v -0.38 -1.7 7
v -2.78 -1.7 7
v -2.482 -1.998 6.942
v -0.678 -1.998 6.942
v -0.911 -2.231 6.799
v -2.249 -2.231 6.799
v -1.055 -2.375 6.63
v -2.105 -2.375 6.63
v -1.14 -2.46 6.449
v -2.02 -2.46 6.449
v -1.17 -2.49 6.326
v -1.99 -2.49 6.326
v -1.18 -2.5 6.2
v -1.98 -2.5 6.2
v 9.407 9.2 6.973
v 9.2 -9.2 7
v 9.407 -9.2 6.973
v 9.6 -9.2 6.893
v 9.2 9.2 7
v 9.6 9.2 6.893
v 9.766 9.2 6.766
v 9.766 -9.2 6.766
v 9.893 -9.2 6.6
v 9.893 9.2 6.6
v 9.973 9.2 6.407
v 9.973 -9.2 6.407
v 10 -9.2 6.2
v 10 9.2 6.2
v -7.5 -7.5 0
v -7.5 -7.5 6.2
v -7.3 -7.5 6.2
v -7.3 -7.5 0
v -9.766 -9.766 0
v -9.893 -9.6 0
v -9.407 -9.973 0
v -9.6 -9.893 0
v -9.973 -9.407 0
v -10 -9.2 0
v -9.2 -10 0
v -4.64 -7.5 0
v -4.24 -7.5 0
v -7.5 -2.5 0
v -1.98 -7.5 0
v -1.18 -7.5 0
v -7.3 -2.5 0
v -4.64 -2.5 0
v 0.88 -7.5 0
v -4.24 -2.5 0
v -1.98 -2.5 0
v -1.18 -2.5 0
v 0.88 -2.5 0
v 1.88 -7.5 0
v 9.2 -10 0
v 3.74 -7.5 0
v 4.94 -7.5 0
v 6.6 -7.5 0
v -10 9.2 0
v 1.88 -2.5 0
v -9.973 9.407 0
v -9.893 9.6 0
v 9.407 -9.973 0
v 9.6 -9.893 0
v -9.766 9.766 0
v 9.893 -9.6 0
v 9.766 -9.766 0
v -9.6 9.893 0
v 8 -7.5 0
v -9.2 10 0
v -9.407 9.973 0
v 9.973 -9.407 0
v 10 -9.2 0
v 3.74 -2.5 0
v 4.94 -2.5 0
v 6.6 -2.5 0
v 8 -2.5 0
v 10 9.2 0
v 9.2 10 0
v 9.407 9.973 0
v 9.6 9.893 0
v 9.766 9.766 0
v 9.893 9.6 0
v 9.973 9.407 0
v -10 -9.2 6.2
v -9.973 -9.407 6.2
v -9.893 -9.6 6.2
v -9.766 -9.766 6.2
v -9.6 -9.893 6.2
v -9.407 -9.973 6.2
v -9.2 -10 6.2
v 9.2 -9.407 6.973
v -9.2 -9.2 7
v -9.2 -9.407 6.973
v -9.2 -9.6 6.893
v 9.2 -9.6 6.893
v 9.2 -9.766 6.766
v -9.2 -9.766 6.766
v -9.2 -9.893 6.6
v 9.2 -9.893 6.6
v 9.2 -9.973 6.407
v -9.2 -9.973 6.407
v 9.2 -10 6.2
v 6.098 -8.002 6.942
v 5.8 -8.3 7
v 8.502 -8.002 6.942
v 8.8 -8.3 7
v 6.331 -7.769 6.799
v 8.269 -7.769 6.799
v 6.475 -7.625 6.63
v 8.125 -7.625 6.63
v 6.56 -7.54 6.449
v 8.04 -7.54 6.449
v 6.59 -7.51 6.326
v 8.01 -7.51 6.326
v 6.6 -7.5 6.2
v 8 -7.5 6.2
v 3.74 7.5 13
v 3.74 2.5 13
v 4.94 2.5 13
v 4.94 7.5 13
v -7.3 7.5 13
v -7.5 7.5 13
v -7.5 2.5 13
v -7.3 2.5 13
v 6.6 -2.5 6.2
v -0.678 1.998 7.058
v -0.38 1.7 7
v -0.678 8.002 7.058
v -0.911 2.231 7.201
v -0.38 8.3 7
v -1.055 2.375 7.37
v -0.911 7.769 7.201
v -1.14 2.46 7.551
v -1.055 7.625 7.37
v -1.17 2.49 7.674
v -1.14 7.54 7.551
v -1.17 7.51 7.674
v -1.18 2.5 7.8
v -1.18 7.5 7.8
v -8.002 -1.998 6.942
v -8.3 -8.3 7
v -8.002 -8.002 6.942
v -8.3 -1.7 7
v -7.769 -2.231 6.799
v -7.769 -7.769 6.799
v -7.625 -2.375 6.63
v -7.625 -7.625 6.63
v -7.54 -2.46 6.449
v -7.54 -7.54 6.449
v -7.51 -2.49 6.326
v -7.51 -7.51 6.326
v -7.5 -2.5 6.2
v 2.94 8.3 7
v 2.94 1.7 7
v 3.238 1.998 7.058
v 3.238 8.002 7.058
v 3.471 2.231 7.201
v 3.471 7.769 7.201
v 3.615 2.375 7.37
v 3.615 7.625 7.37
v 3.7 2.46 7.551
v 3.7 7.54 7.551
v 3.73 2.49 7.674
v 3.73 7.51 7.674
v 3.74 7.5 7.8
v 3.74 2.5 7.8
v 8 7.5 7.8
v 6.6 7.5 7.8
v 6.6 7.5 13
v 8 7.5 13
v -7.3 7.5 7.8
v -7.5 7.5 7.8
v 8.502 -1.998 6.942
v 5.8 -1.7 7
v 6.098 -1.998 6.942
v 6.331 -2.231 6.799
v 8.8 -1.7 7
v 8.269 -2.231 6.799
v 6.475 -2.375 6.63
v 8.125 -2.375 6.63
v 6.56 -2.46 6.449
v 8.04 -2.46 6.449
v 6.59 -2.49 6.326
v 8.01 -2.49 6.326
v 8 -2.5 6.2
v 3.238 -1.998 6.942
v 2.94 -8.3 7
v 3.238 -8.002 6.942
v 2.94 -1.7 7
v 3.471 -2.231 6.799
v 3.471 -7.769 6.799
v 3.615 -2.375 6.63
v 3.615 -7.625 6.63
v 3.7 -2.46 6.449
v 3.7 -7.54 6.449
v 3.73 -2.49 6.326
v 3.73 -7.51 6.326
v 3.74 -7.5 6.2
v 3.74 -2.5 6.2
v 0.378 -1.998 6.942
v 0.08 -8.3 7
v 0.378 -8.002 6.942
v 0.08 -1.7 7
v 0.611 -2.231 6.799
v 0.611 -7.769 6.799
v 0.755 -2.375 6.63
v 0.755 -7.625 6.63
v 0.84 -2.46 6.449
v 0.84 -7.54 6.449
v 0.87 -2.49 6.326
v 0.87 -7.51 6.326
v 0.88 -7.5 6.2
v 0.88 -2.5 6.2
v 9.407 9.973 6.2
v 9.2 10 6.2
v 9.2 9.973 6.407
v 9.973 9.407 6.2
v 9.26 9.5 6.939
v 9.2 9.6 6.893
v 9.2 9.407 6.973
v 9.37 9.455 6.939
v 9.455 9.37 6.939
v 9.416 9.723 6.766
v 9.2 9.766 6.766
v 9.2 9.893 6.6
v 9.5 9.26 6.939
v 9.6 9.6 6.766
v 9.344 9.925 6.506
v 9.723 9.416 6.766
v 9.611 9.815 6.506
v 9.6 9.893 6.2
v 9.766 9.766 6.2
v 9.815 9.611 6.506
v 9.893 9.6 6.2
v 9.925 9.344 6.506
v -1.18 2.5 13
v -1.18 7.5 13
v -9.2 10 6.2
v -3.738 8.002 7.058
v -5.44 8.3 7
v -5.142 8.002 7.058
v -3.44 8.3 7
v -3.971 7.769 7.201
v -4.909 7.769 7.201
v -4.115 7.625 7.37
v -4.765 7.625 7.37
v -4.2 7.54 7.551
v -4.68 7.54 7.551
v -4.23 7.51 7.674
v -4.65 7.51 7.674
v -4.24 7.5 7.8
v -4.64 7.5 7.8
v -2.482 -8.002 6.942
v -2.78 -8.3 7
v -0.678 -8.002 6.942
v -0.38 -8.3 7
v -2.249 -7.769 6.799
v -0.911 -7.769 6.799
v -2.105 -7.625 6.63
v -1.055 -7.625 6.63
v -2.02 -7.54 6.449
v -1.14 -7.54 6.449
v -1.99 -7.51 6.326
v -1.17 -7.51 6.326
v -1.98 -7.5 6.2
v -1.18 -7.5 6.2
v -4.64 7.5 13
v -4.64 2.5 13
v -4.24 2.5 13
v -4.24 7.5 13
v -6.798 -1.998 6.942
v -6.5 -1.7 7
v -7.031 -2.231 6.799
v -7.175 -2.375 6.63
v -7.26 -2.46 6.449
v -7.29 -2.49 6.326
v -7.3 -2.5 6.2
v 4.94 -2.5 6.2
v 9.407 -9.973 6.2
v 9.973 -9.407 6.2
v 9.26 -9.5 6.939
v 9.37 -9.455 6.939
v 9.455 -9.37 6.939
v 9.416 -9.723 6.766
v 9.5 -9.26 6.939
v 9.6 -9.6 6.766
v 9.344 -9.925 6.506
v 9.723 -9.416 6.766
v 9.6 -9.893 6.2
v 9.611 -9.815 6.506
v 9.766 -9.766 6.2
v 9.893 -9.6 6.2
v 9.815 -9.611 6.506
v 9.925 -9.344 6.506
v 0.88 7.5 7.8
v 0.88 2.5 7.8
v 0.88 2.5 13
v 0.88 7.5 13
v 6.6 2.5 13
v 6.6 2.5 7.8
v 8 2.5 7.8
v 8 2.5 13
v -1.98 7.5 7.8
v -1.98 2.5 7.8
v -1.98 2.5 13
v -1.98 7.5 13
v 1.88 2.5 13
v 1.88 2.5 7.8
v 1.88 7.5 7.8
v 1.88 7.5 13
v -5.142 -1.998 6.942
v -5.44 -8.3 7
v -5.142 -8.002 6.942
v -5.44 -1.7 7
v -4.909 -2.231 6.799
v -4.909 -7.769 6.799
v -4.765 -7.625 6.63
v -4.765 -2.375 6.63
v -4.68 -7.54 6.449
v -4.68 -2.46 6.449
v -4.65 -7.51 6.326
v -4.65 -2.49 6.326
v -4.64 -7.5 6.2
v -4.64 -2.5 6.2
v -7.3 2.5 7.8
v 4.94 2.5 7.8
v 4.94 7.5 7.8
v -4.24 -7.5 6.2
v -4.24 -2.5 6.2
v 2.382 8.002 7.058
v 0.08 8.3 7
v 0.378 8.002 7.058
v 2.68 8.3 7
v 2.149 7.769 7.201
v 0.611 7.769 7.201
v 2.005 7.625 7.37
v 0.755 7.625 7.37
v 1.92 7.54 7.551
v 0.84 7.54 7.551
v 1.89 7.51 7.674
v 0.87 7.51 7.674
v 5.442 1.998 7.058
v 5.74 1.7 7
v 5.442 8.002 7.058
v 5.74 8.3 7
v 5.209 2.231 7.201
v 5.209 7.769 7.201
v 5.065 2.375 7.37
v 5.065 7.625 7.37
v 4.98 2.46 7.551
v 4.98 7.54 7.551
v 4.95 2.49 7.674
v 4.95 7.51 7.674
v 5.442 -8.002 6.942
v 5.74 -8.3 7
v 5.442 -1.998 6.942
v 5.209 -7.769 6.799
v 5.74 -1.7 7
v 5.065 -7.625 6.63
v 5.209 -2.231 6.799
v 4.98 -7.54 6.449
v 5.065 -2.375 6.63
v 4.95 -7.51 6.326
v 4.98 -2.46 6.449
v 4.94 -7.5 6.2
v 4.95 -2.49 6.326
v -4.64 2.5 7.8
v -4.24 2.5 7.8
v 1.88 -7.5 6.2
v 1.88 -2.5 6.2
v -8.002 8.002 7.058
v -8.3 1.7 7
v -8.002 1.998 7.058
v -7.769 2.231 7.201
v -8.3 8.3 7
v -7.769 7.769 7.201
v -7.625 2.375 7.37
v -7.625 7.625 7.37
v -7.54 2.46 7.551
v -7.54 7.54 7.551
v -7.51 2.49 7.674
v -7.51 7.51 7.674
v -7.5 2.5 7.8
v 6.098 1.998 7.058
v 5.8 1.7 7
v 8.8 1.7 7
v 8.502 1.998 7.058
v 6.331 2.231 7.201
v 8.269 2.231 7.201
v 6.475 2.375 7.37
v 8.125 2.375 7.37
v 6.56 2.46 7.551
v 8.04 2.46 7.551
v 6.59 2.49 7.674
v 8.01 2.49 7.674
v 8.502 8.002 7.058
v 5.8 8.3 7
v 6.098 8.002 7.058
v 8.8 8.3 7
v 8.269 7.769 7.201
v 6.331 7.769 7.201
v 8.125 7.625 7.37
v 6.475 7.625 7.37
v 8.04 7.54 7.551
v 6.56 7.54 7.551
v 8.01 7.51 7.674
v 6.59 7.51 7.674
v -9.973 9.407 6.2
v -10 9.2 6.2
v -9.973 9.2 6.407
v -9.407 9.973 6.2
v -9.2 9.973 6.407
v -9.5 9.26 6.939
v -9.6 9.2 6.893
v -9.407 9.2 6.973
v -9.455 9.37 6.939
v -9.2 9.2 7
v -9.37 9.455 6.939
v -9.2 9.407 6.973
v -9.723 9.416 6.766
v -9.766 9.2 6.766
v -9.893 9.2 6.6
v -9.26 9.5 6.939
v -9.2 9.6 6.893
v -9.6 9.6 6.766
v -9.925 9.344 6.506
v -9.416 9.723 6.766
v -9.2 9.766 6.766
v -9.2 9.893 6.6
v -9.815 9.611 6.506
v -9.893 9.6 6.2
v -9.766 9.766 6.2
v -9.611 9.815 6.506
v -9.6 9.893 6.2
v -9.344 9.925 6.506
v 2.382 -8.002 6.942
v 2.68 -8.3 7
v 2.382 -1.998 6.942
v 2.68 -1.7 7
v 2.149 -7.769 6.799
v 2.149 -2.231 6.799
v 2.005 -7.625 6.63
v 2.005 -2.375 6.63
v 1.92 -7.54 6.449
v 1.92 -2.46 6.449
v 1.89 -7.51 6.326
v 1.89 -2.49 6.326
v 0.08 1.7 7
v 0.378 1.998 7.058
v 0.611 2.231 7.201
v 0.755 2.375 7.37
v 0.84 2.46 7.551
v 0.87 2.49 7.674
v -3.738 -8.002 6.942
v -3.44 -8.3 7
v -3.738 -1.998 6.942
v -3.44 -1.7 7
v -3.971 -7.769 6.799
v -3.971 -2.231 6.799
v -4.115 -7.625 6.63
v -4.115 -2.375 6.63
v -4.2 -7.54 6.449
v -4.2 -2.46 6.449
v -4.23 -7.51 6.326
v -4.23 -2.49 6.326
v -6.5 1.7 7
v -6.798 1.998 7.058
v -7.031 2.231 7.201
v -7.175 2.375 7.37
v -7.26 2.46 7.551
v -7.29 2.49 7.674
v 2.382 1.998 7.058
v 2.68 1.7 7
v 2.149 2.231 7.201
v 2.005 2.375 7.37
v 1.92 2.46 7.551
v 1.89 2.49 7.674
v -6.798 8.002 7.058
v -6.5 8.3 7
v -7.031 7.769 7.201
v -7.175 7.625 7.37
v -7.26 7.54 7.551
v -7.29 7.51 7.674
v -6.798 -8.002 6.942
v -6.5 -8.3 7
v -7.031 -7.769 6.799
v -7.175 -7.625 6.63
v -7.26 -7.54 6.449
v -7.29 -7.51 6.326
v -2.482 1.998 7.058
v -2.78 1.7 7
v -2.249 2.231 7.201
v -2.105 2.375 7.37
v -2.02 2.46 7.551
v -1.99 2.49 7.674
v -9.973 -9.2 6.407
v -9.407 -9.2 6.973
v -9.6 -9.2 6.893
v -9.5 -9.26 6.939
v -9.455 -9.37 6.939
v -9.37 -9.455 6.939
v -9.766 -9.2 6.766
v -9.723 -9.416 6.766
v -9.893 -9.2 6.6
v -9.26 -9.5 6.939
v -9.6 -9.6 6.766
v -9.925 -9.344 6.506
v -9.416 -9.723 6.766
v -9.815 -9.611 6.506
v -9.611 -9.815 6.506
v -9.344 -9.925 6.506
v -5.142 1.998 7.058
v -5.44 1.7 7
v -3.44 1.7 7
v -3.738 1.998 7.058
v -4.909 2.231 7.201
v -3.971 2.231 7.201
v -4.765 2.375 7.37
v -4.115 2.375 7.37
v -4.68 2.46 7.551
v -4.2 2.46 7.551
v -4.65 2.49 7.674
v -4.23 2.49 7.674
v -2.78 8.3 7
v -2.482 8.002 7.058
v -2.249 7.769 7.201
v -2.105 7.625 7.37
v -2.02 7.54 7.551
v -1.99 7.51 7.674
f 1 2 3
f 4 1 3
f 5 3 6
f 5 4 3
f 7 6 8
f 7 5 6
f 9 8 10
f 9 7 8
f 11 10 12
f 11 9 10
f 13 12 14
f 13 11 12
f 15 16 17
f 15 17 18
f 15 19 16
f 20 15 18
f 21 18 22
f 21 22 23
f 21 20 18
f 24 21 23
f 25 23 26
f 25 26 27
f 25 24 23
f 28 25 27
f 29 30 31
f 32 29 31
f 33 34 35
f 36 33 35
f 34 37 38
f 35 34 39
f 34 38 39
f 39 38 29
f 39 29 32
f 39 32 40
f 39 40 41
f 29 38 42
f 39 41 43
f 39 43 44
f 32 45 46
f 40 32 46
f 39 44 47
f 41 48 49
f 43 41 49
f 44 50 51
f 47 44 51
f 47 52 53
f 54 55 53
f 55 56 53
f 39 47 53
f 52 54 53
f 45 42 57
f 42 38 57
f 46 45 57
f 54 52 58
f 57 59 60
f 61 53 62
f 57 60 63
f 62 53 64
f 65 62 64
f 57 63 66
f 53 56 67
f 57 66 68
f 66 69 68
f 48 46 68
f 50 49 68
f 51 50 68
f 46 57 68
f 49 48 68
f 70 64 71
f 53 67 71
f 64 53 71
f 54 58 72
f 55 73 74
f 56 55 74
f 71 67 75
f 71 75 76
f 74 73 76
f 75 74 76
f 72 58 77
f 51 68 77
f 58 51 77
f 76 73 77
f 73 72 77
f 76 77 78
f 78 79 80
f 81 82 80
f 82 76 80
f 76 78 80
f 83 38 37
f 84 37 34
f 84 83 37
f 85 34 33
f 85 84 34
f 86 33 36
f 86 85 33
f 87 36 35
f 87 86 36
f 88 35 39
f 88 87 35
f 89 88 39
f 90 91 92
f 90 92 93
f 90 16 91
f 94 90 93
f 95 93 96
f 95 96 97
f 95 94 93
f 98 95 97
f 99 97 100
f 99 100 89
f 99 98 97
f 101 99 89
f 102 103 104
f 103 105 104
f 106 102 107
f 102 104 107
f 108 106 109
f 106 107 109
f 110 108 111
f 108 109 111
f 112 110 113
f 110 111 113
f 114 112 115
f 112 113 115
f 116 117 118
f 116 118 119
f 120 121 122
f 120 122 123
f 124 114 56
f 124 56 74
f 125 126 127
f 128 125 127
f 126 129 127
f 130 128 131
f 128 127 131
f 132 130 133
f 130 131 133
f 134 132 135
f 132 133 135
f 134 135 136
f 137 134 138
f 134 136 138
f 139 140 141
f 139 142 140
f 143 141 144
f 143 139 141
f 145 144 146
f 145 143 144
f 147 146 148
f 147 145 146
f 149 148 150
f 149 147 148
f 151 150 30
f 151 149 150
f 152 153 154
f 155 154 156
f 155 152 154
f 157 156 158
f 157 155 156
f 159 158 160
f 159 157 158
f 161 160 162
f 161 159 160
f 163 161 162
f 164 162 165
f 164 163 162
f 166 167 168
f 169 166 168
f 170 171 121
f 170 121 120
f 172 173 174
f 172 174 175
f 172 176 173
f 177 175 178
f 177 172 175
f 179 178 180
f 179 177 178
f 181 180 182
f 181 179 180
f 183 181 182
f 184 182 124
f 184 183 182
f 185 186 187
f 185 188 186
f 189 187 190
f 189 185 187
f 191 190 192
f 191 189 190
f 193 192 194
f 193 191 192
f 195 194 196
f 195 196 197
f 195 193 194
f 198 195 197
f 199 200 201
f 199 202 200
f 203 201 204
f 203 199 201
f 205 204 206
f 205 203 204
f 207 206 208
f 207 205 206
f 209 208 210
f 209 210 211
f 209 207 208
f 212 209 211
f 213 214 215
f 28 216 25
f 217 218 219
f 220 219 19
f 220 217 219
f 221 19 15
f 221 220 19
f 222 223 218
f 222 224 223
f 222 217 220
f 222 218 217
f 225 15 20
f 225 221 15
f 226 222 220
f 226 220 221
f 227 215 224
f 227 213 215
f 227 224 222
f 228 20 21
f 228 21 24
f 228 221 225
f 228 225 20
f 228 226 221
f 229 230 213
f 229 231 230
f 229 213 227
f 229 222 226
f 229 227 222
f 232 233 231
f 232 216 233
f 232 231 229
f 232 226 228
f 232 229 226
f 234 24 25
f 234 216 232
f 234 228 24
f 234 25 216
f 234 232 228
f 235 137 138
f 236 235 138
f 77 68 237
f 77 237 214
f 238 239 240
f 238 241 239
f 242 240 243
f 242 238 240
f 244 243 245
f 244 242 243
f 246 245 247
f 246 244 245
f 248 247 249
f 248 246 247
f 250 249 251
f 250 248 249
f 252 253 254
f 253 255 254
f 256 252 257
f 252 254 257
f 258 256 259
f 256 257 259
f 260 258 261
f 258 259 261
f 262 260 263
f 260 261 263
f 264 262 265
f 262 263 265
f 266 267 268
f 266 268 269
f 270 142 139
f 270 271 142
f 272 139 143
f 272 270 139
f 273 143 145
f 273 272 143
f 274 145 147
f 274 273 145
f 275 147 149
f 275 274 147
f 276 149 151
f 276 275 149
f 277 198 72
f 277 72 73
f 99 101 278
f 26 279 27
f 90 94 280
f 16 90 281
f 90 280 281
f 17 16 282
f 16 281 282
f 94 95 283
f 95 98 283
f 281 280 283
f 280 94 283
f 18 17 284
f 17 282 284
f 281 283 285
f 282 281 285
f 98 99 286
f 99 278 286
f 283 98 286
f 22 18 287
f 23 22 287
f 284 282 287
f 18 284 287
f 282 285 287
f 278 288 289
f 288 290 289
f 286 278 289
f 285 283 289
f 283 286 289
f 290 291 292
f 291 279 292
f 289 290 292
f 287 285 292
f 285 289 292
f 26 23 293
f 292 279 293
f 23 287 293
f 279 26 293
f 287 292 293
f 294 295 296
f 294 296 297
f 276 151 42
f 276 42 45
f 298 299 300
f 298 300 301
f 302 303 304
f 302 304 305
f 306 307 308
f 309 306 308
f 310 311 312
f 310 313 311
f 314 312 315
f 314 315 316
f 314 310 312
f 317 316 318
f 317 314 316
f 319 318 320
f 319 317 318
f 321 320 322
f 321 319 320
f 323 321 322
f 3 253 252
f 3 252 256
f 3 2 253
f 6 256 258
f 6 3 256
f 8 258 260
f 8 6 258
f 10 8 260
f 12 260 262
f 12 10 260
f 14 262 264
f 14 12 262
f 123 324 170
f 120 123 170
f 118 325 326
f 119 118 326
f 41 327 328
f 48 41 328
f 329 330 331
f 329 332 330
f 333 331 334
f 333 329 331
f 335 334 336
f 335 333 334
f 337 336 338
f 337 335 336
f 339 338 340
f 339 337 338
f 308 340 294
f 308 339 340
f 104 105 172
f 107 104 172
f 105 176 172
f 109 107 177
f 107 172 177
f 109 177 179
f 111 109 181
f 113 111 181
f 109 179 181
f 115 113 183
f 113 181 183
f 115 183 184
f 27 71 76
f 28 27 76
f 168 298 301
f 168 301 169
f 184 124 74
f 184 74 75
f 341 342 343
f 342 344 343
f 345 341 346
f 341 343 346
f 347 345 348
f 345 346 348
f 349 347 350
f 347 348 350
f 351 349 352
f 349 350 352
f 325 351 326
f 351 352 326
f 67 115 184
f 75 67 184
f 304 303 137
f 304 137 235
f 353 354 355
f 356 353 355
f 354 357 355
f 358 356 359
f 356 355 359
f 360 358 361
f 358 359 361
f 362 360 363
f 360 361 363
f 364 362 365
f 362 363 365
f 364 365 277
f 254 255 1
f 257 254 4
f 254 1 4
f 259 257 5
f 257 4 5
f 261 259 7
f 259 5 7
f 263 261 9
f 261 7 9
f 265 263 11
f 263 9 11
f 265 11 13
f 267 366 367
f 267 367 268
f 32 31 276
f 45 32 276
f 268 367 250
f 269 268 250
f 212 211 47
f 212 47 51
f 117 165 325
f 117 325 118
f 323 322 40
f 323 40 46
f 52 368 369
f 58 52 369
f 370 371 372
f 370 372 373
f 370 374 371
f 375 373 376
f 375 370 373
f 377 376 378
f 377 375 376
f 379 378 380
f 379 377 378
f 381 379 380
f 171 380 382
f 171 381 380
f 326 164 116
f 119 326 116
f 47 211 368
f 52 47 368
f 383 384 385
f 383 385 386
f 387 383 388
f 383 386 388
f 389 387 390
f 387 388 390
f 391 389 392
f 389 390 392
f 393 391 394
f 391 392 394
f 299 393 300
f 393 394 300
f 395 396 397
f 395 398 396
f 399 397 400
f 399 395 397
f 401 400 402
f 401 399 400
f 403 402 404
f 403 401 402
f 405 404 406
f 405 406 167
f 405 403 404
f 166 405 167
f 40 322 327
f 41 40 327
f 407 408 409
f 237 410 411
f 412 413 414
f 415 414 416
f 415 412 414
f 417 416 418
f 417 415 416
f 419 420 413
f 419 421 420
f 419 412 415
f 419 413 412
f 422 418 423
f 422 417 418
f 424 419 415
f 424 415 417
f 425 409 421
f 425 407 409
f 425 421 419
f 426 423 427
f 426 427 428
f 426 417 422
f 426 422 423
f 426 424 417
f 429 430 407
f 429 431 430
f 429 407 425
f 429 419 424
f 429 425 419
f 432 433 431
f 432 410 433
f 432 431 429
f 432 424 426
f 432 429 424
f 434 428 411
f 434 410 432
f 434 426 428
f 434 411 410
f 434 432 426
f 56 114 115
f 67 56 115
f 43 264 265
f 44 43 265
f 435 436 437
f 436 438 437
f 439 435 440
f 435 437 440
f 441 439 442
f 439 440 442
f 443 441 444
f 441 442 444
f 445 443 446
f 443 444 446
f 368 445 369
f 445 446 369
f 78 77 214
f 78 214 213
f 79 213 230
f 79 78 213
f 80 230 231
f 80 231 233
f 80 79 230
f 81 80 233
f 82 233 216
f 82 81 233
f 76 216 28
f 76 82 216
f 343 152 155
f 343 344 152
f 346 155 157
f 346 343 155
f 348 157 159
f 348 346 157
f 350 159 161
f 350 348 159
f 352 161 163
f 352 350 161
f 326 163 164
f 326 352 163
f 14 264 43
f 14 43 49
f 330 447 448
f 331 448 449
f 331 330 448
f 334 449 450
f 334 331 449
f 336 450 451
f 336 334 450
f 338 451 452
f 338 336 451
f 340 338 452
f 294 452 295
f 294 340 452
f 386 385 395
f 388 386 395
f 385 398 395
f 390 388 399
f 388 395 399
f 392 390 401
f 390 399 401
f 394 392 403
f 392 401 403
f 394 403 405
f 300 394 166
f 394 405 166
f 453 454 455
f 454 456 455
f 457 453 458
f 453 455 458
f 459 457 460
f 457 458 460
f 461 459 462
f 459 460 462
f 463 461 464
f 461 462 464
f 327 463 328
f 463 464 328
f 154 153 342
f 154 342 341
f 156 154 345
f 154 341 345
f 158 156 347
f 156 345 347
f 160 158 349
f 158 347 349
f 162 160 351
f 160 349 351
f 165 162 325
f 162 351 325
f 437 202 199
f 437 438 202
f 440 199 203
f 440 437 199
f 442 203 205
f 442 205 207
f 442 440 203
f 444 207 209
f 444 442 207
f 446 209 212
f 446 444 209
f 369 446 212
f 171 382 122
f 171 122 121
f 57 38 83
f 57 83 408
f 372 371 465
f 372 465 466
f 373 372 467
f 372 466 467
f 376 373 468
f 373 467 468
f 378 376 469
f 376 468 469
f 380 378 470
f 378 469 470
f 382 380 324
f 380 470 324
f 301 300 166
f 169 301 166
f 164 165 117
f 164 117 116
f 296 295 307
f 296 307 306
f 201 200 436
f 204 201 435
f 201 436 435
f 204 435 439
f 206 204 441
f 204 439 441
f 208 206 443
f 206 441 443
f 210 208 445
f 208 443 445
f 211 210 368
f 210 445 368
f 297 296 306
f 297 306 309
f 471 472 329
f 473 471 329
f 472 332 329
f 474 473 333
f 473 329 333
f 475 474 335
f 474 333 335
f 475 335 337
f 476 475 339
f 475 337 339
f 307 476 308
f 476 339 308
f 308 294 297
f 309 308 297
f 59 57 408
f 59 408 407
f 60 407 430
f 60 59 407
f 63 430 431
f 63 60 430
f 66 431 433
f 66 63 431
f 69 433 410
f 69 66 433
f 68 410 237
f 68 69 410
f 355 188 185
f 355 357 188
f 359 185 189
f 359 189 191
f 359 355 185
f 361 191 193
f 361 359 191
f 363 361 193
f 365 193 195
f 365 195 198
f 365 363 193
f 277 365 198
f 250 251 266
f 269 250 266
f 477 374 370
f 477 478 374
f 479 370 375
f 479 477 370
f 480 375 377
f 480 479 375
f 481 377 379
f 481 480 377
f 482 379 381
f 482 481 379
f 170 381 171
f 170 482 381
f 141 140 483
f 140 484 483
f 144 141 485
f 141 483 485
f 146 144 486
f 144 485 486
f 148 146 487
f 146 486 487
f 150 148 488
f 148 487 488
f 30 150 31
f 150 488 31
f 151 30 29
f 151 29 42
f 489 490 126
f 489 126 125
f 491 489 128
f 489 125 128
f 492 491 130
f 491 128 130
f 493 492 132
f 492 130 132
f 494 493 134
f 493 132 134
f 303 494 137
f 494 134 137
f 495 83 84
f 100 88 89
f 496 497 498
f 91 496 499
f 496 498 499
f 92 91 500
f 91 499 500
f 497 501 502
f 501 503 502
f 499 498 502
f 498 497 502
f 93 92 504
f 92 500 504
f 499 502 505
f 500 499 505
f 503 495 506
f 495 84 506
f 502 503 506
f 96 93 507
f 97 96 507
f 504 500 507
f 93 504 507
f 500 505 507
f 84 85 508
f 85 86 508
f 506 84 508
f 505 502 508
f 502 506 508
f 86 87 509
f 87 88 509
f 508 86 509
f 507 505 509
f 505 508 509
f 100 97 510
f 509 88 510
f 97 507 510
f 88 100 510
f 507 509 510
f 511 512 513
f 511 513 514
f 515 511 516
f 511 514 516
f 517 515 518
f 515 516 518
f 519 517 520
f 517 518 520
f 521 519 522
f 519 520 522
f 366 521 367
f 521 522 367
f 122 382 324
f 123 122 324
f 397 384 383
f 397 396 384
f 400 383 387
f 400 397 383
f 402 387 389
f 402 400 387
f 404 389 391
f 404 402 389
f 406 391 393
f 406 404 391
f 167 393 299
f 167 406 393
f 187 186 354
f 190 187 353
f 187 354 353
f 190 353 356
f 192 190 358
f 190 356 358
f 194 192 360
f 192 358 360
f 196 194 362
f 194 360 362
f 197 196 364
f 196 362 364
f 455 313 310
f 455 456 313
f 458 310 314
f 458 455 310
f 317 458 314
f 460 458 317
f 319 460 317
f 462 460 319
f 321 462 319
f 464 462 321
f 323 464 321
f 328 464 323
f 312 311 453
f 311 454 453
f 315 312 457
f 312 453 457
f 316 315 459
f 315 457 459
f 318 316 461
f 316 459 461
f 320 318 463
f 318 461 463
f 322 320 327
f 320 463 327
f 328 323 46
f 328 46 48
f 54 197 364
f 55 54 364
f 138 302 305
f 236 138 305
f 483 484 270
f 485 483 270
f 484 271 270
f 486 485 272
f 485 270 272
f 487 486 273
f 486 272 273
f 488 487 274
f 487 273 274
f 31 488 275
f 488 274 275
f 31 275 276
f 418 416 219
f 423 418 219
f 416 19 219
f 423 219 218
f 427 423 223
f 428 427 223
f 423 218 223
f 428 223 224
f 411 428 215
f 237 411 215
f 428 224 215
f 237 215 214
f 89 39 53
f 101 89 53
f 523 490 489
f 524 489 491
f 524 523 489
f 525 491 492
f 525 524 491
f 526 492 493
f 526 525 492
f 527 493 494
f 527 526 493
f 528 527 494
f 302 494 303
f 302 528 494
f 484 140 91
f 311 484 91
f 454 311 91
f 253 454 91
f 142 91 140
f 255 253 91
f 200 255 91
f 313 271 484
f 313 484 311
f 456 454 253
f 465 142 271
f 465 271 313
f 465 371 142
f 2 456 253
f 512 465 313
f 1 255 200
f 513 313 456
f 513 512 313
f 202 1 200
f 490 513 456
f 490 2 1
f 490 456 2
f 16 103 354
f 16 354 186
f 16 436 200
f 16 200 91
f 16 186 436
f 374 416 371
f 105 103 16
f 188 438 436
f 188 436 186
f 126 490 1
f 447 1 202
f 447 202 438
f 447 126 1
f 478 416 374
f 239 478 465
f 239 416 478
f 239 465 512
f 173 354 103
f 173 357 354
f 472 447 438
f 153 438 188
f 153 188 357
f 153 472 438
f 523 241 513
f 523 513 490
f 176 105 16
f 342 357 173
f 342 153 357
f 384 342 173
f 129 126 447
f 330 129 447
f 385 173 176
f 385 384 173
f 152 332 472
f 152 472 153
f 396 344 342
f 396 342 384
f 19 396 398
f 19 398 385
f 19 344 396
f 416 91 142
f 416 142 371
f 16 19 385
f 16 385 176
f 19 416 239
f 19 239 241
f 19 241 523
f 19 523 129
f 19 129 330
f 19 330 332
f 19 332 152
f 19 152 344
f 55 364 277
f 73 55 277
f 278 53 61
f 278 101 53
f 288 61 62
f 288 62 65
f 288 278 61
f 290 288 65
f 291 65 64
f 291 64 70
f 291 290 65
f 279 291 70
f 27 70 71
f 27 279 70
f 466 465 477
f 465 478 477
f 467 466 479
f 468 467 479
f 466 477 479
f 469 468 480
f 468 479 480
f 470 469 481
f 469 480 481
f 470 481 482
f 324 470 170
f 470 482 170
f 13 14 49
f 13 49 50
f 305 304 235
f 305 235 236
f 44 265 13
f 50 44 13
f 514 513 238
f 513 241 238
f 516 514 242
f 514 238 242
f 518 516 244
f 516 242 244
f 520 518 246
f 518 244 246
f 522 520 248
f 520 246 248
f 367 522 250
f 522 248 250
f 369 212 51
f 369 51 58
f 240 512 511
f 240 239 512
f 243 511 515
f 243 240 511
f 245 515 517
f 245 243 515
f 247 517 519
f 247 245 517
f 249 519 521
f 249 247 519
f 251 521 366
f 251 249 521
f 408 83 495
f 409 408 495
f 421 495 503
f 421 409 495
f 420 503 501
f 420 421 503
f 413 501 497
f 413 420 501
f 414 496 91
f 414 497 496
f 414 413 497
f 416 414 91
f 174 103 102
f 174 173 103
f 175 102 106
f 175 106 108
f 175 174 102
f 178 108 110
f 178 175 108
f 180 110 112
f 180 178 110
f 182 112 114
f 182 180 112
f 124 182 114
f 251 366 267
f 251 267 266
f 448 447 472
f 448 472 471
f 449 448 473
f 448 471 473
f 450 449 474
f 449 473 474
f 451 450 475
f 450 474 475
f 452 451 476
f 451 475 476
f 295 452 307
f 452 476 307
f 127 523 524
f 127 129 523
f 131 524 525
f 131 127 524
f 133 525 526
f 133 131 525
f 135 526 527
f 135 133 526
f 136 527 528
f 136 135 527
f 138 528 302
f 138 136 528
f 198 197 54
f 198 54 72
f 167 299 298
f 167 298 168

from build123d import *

# Parameters (mm, degrees)
F0_W      = 20
F0_H      = 20
F1_DEPTH  = 3
F2_W      = 0.2
F2_H      = 5
F3_DEPTH  = 10
F4_DEPTH  = 0.1
F5_DEPTH  = 0.4
F6_DEPTH  = 0.5
F7_DEPTH  = 0.6
F8_DEPTH  = 0.7
F9_DEPTH  = 4
F10_W     = 0.2
F10_H     = 5
F10_W_2   = 0.4
F10_W_3   = 0.8
F10_W_4   = 1
F10_W_5   = 1.2
F10_W_6   = 1.4
F11_DEPTH = 7
F12_R     = 0.8


with BuildPart() as f1:
    # F0 (on Top) → F1 (new body)
    with BuildSketch(Plane.XY):
        Rectangle(F0_W, F0_H)
    extrude(amount=F1_DEPTH)

    # F2 (on face) → F3 (join)
    with BuildSketch(Plane.XY.offset(3)):
        with Locations((-7.4, 5)):
            Rectangle(F2_W, F2_H)
        with Locations((-4.44, 5)):
            Rectangle(F2_W, F2_H)
        with Locations((-1.48, 5)):
            Rectangle(F2_W, F2_H)
        with Locations((1.48, 5)):
            Rectangle(F2_W, F2_H)
        with Locations((4.44, 5)):
            Rectangle(F2_W, F2_H)
        with Locations((7.4, 5)):
            Rectangle(F2_W, F2_H)
    extrude(amount=F3_DEPTH)

    # F4 (add, symmetric): faces of the model
    f4_faces = [f1.faces().sort_by_distance(p)[0] for p in [
        (-4.54, 5, 8),
        (-4.34, 5, 8),
    ]]
    extrude(f4_faces, amount=F4_DEPTH, both=True, dir=(-1, 0, 0))

    # F5 (add, symmetric): a face of the model
    f5_faces = [f1.faces().sort_by_distance(p)[0] for p in [
        (-1.58, 5, 8),
    ]]
    extrude(f5_faces, amount=F5_DEPTH, both=True)

    # F6 (add, symmetric): a face of the model
    f6_faces = [f1.faces().sort_by_distance(p)[0] for p in [
        (1.38, 5, 8),
    ]]
    extrude(f6_faces, amount=F6_DEPTH, both=True)

    # F7 (add, symmetric): a face of the model
    f7_faces = [f1.faces().sort_by_distance(p)[0] for p in [
        (4.34, 5, 8),
    ]]
    extrude(f7_faces, amount=F7_DEPTH, both=True)

    # F8 (add, symmetric): a face of the model
    f8_faces = [f1.faces().sort_by_distance(p)[0] for p in [
        (7.3, 5, 8),
    ]]
    extrude(f8_faces, amount=F8_DEPTH, both=True)

    # F9 (add): a face of the model
    f9_faces = [f1.faces().sort_by_distance(p)[0] for p in [
        (-0.16384, -0.3333333333, 3),
    ]]
    extrude(f9_faces, amount=F9_DEPTH)

    # F10 (on face) → F11 (cut, through all)
    with BuildSketch(Plane.XY.offset(7)):
        with Locations((-7.4, -5)):
            Rectangle(F10_W, F10_H)
        with Locations((-4.44, -5)):
            Rectangle(F10_W_2, F10_H)
        with Locations((-1.58, -5)):
            Rectangle(F10_W_3, F10_H)
        with Locations((1.38, -5)):
            Rectangle(F10_W_4, F10_H)
        with Locations((4.34, -5)):
            Rectangle(F10_W_5, F10_H)
        with Locations((7.3, -5)):
            Rectangle(F10_W_6, F10_H)
    extrude(amount=-F11_DEPTH, mode=Mode.SUBTRACT)

    # F12
    f12_edges = [f1.edges().sort_by_distance(p)[0] for p in [
        (10, -10, 3.5),
        (-10, -10, 3.5),
        (-10, 10, 3.5),
        (10, 10, 3.5),
        (-10, 0, 7),
        (0, 10, 7),
        (0, -10, 7),
        (10, 0, 7),
        (-7.5, 5, 7),
        (-7.3, 5, 7),
        (-4.64, 5, 7),
        (-4.24, 5, 7),
        (-1.98, 5, 7),
        (-1.18, 5, 7),
        (0.88, 5, 7),
        (1.88, 5, 7),
        (3.74, 5, 7),
        (6.6, 5, 7),
        (4.94, 5, 7),
        (8, 5, 7),
        (-7.4, 7.5, 7),
        (-7.4, 2.5, 7),
        (-4.44, 2.5, 7),
        (-1.58, 2.5, 7),
        (1.38, 2.5, 7),
        (4.34, 2.5, 7),
        (7.3, 2.5, 7),
        (7.3, -2.5, 7),
        (8, -5, 7),
        (6.6, -5, 7),
        (7.3, -7.5, 7),
        (4.94, -5, 7),
        (4.34, -2.5, 7),
        (4.34, -7.5, 7),
        (3.74, -5, 7),
        (1.88, -5, 7),
        (1.38, -2.5, 7),
        (1.38, -7.5, 7),
        (0.88, -5, 7),
        (-1.18, -5, 7),
        (-1.98, -5, 7),
        (-1.58, -2.5, 7),
        (-1.58, -7.5, 7),
        (-4.24, -5, 7),
        (-4.44, -2.5, 7),
        (-4.64, -5, 7),
        (-4.44, -7.5, 7),
        (-7.3, -5, 7),
        (-7.5, -5, 7),
        (-7.4, -2.5, 7),
        (-7.4, -7.5, 7),
        (-4.44, 7.5, 7),
        (-1.58, 7.5, 7),
        (1.38, 7.5, 7),
        (4.34, 7.5, 7),
        (7.3, 7.5, 7),
    ]]
    fillet(f12_edges, radius=F12_R)


solid = f1.part
